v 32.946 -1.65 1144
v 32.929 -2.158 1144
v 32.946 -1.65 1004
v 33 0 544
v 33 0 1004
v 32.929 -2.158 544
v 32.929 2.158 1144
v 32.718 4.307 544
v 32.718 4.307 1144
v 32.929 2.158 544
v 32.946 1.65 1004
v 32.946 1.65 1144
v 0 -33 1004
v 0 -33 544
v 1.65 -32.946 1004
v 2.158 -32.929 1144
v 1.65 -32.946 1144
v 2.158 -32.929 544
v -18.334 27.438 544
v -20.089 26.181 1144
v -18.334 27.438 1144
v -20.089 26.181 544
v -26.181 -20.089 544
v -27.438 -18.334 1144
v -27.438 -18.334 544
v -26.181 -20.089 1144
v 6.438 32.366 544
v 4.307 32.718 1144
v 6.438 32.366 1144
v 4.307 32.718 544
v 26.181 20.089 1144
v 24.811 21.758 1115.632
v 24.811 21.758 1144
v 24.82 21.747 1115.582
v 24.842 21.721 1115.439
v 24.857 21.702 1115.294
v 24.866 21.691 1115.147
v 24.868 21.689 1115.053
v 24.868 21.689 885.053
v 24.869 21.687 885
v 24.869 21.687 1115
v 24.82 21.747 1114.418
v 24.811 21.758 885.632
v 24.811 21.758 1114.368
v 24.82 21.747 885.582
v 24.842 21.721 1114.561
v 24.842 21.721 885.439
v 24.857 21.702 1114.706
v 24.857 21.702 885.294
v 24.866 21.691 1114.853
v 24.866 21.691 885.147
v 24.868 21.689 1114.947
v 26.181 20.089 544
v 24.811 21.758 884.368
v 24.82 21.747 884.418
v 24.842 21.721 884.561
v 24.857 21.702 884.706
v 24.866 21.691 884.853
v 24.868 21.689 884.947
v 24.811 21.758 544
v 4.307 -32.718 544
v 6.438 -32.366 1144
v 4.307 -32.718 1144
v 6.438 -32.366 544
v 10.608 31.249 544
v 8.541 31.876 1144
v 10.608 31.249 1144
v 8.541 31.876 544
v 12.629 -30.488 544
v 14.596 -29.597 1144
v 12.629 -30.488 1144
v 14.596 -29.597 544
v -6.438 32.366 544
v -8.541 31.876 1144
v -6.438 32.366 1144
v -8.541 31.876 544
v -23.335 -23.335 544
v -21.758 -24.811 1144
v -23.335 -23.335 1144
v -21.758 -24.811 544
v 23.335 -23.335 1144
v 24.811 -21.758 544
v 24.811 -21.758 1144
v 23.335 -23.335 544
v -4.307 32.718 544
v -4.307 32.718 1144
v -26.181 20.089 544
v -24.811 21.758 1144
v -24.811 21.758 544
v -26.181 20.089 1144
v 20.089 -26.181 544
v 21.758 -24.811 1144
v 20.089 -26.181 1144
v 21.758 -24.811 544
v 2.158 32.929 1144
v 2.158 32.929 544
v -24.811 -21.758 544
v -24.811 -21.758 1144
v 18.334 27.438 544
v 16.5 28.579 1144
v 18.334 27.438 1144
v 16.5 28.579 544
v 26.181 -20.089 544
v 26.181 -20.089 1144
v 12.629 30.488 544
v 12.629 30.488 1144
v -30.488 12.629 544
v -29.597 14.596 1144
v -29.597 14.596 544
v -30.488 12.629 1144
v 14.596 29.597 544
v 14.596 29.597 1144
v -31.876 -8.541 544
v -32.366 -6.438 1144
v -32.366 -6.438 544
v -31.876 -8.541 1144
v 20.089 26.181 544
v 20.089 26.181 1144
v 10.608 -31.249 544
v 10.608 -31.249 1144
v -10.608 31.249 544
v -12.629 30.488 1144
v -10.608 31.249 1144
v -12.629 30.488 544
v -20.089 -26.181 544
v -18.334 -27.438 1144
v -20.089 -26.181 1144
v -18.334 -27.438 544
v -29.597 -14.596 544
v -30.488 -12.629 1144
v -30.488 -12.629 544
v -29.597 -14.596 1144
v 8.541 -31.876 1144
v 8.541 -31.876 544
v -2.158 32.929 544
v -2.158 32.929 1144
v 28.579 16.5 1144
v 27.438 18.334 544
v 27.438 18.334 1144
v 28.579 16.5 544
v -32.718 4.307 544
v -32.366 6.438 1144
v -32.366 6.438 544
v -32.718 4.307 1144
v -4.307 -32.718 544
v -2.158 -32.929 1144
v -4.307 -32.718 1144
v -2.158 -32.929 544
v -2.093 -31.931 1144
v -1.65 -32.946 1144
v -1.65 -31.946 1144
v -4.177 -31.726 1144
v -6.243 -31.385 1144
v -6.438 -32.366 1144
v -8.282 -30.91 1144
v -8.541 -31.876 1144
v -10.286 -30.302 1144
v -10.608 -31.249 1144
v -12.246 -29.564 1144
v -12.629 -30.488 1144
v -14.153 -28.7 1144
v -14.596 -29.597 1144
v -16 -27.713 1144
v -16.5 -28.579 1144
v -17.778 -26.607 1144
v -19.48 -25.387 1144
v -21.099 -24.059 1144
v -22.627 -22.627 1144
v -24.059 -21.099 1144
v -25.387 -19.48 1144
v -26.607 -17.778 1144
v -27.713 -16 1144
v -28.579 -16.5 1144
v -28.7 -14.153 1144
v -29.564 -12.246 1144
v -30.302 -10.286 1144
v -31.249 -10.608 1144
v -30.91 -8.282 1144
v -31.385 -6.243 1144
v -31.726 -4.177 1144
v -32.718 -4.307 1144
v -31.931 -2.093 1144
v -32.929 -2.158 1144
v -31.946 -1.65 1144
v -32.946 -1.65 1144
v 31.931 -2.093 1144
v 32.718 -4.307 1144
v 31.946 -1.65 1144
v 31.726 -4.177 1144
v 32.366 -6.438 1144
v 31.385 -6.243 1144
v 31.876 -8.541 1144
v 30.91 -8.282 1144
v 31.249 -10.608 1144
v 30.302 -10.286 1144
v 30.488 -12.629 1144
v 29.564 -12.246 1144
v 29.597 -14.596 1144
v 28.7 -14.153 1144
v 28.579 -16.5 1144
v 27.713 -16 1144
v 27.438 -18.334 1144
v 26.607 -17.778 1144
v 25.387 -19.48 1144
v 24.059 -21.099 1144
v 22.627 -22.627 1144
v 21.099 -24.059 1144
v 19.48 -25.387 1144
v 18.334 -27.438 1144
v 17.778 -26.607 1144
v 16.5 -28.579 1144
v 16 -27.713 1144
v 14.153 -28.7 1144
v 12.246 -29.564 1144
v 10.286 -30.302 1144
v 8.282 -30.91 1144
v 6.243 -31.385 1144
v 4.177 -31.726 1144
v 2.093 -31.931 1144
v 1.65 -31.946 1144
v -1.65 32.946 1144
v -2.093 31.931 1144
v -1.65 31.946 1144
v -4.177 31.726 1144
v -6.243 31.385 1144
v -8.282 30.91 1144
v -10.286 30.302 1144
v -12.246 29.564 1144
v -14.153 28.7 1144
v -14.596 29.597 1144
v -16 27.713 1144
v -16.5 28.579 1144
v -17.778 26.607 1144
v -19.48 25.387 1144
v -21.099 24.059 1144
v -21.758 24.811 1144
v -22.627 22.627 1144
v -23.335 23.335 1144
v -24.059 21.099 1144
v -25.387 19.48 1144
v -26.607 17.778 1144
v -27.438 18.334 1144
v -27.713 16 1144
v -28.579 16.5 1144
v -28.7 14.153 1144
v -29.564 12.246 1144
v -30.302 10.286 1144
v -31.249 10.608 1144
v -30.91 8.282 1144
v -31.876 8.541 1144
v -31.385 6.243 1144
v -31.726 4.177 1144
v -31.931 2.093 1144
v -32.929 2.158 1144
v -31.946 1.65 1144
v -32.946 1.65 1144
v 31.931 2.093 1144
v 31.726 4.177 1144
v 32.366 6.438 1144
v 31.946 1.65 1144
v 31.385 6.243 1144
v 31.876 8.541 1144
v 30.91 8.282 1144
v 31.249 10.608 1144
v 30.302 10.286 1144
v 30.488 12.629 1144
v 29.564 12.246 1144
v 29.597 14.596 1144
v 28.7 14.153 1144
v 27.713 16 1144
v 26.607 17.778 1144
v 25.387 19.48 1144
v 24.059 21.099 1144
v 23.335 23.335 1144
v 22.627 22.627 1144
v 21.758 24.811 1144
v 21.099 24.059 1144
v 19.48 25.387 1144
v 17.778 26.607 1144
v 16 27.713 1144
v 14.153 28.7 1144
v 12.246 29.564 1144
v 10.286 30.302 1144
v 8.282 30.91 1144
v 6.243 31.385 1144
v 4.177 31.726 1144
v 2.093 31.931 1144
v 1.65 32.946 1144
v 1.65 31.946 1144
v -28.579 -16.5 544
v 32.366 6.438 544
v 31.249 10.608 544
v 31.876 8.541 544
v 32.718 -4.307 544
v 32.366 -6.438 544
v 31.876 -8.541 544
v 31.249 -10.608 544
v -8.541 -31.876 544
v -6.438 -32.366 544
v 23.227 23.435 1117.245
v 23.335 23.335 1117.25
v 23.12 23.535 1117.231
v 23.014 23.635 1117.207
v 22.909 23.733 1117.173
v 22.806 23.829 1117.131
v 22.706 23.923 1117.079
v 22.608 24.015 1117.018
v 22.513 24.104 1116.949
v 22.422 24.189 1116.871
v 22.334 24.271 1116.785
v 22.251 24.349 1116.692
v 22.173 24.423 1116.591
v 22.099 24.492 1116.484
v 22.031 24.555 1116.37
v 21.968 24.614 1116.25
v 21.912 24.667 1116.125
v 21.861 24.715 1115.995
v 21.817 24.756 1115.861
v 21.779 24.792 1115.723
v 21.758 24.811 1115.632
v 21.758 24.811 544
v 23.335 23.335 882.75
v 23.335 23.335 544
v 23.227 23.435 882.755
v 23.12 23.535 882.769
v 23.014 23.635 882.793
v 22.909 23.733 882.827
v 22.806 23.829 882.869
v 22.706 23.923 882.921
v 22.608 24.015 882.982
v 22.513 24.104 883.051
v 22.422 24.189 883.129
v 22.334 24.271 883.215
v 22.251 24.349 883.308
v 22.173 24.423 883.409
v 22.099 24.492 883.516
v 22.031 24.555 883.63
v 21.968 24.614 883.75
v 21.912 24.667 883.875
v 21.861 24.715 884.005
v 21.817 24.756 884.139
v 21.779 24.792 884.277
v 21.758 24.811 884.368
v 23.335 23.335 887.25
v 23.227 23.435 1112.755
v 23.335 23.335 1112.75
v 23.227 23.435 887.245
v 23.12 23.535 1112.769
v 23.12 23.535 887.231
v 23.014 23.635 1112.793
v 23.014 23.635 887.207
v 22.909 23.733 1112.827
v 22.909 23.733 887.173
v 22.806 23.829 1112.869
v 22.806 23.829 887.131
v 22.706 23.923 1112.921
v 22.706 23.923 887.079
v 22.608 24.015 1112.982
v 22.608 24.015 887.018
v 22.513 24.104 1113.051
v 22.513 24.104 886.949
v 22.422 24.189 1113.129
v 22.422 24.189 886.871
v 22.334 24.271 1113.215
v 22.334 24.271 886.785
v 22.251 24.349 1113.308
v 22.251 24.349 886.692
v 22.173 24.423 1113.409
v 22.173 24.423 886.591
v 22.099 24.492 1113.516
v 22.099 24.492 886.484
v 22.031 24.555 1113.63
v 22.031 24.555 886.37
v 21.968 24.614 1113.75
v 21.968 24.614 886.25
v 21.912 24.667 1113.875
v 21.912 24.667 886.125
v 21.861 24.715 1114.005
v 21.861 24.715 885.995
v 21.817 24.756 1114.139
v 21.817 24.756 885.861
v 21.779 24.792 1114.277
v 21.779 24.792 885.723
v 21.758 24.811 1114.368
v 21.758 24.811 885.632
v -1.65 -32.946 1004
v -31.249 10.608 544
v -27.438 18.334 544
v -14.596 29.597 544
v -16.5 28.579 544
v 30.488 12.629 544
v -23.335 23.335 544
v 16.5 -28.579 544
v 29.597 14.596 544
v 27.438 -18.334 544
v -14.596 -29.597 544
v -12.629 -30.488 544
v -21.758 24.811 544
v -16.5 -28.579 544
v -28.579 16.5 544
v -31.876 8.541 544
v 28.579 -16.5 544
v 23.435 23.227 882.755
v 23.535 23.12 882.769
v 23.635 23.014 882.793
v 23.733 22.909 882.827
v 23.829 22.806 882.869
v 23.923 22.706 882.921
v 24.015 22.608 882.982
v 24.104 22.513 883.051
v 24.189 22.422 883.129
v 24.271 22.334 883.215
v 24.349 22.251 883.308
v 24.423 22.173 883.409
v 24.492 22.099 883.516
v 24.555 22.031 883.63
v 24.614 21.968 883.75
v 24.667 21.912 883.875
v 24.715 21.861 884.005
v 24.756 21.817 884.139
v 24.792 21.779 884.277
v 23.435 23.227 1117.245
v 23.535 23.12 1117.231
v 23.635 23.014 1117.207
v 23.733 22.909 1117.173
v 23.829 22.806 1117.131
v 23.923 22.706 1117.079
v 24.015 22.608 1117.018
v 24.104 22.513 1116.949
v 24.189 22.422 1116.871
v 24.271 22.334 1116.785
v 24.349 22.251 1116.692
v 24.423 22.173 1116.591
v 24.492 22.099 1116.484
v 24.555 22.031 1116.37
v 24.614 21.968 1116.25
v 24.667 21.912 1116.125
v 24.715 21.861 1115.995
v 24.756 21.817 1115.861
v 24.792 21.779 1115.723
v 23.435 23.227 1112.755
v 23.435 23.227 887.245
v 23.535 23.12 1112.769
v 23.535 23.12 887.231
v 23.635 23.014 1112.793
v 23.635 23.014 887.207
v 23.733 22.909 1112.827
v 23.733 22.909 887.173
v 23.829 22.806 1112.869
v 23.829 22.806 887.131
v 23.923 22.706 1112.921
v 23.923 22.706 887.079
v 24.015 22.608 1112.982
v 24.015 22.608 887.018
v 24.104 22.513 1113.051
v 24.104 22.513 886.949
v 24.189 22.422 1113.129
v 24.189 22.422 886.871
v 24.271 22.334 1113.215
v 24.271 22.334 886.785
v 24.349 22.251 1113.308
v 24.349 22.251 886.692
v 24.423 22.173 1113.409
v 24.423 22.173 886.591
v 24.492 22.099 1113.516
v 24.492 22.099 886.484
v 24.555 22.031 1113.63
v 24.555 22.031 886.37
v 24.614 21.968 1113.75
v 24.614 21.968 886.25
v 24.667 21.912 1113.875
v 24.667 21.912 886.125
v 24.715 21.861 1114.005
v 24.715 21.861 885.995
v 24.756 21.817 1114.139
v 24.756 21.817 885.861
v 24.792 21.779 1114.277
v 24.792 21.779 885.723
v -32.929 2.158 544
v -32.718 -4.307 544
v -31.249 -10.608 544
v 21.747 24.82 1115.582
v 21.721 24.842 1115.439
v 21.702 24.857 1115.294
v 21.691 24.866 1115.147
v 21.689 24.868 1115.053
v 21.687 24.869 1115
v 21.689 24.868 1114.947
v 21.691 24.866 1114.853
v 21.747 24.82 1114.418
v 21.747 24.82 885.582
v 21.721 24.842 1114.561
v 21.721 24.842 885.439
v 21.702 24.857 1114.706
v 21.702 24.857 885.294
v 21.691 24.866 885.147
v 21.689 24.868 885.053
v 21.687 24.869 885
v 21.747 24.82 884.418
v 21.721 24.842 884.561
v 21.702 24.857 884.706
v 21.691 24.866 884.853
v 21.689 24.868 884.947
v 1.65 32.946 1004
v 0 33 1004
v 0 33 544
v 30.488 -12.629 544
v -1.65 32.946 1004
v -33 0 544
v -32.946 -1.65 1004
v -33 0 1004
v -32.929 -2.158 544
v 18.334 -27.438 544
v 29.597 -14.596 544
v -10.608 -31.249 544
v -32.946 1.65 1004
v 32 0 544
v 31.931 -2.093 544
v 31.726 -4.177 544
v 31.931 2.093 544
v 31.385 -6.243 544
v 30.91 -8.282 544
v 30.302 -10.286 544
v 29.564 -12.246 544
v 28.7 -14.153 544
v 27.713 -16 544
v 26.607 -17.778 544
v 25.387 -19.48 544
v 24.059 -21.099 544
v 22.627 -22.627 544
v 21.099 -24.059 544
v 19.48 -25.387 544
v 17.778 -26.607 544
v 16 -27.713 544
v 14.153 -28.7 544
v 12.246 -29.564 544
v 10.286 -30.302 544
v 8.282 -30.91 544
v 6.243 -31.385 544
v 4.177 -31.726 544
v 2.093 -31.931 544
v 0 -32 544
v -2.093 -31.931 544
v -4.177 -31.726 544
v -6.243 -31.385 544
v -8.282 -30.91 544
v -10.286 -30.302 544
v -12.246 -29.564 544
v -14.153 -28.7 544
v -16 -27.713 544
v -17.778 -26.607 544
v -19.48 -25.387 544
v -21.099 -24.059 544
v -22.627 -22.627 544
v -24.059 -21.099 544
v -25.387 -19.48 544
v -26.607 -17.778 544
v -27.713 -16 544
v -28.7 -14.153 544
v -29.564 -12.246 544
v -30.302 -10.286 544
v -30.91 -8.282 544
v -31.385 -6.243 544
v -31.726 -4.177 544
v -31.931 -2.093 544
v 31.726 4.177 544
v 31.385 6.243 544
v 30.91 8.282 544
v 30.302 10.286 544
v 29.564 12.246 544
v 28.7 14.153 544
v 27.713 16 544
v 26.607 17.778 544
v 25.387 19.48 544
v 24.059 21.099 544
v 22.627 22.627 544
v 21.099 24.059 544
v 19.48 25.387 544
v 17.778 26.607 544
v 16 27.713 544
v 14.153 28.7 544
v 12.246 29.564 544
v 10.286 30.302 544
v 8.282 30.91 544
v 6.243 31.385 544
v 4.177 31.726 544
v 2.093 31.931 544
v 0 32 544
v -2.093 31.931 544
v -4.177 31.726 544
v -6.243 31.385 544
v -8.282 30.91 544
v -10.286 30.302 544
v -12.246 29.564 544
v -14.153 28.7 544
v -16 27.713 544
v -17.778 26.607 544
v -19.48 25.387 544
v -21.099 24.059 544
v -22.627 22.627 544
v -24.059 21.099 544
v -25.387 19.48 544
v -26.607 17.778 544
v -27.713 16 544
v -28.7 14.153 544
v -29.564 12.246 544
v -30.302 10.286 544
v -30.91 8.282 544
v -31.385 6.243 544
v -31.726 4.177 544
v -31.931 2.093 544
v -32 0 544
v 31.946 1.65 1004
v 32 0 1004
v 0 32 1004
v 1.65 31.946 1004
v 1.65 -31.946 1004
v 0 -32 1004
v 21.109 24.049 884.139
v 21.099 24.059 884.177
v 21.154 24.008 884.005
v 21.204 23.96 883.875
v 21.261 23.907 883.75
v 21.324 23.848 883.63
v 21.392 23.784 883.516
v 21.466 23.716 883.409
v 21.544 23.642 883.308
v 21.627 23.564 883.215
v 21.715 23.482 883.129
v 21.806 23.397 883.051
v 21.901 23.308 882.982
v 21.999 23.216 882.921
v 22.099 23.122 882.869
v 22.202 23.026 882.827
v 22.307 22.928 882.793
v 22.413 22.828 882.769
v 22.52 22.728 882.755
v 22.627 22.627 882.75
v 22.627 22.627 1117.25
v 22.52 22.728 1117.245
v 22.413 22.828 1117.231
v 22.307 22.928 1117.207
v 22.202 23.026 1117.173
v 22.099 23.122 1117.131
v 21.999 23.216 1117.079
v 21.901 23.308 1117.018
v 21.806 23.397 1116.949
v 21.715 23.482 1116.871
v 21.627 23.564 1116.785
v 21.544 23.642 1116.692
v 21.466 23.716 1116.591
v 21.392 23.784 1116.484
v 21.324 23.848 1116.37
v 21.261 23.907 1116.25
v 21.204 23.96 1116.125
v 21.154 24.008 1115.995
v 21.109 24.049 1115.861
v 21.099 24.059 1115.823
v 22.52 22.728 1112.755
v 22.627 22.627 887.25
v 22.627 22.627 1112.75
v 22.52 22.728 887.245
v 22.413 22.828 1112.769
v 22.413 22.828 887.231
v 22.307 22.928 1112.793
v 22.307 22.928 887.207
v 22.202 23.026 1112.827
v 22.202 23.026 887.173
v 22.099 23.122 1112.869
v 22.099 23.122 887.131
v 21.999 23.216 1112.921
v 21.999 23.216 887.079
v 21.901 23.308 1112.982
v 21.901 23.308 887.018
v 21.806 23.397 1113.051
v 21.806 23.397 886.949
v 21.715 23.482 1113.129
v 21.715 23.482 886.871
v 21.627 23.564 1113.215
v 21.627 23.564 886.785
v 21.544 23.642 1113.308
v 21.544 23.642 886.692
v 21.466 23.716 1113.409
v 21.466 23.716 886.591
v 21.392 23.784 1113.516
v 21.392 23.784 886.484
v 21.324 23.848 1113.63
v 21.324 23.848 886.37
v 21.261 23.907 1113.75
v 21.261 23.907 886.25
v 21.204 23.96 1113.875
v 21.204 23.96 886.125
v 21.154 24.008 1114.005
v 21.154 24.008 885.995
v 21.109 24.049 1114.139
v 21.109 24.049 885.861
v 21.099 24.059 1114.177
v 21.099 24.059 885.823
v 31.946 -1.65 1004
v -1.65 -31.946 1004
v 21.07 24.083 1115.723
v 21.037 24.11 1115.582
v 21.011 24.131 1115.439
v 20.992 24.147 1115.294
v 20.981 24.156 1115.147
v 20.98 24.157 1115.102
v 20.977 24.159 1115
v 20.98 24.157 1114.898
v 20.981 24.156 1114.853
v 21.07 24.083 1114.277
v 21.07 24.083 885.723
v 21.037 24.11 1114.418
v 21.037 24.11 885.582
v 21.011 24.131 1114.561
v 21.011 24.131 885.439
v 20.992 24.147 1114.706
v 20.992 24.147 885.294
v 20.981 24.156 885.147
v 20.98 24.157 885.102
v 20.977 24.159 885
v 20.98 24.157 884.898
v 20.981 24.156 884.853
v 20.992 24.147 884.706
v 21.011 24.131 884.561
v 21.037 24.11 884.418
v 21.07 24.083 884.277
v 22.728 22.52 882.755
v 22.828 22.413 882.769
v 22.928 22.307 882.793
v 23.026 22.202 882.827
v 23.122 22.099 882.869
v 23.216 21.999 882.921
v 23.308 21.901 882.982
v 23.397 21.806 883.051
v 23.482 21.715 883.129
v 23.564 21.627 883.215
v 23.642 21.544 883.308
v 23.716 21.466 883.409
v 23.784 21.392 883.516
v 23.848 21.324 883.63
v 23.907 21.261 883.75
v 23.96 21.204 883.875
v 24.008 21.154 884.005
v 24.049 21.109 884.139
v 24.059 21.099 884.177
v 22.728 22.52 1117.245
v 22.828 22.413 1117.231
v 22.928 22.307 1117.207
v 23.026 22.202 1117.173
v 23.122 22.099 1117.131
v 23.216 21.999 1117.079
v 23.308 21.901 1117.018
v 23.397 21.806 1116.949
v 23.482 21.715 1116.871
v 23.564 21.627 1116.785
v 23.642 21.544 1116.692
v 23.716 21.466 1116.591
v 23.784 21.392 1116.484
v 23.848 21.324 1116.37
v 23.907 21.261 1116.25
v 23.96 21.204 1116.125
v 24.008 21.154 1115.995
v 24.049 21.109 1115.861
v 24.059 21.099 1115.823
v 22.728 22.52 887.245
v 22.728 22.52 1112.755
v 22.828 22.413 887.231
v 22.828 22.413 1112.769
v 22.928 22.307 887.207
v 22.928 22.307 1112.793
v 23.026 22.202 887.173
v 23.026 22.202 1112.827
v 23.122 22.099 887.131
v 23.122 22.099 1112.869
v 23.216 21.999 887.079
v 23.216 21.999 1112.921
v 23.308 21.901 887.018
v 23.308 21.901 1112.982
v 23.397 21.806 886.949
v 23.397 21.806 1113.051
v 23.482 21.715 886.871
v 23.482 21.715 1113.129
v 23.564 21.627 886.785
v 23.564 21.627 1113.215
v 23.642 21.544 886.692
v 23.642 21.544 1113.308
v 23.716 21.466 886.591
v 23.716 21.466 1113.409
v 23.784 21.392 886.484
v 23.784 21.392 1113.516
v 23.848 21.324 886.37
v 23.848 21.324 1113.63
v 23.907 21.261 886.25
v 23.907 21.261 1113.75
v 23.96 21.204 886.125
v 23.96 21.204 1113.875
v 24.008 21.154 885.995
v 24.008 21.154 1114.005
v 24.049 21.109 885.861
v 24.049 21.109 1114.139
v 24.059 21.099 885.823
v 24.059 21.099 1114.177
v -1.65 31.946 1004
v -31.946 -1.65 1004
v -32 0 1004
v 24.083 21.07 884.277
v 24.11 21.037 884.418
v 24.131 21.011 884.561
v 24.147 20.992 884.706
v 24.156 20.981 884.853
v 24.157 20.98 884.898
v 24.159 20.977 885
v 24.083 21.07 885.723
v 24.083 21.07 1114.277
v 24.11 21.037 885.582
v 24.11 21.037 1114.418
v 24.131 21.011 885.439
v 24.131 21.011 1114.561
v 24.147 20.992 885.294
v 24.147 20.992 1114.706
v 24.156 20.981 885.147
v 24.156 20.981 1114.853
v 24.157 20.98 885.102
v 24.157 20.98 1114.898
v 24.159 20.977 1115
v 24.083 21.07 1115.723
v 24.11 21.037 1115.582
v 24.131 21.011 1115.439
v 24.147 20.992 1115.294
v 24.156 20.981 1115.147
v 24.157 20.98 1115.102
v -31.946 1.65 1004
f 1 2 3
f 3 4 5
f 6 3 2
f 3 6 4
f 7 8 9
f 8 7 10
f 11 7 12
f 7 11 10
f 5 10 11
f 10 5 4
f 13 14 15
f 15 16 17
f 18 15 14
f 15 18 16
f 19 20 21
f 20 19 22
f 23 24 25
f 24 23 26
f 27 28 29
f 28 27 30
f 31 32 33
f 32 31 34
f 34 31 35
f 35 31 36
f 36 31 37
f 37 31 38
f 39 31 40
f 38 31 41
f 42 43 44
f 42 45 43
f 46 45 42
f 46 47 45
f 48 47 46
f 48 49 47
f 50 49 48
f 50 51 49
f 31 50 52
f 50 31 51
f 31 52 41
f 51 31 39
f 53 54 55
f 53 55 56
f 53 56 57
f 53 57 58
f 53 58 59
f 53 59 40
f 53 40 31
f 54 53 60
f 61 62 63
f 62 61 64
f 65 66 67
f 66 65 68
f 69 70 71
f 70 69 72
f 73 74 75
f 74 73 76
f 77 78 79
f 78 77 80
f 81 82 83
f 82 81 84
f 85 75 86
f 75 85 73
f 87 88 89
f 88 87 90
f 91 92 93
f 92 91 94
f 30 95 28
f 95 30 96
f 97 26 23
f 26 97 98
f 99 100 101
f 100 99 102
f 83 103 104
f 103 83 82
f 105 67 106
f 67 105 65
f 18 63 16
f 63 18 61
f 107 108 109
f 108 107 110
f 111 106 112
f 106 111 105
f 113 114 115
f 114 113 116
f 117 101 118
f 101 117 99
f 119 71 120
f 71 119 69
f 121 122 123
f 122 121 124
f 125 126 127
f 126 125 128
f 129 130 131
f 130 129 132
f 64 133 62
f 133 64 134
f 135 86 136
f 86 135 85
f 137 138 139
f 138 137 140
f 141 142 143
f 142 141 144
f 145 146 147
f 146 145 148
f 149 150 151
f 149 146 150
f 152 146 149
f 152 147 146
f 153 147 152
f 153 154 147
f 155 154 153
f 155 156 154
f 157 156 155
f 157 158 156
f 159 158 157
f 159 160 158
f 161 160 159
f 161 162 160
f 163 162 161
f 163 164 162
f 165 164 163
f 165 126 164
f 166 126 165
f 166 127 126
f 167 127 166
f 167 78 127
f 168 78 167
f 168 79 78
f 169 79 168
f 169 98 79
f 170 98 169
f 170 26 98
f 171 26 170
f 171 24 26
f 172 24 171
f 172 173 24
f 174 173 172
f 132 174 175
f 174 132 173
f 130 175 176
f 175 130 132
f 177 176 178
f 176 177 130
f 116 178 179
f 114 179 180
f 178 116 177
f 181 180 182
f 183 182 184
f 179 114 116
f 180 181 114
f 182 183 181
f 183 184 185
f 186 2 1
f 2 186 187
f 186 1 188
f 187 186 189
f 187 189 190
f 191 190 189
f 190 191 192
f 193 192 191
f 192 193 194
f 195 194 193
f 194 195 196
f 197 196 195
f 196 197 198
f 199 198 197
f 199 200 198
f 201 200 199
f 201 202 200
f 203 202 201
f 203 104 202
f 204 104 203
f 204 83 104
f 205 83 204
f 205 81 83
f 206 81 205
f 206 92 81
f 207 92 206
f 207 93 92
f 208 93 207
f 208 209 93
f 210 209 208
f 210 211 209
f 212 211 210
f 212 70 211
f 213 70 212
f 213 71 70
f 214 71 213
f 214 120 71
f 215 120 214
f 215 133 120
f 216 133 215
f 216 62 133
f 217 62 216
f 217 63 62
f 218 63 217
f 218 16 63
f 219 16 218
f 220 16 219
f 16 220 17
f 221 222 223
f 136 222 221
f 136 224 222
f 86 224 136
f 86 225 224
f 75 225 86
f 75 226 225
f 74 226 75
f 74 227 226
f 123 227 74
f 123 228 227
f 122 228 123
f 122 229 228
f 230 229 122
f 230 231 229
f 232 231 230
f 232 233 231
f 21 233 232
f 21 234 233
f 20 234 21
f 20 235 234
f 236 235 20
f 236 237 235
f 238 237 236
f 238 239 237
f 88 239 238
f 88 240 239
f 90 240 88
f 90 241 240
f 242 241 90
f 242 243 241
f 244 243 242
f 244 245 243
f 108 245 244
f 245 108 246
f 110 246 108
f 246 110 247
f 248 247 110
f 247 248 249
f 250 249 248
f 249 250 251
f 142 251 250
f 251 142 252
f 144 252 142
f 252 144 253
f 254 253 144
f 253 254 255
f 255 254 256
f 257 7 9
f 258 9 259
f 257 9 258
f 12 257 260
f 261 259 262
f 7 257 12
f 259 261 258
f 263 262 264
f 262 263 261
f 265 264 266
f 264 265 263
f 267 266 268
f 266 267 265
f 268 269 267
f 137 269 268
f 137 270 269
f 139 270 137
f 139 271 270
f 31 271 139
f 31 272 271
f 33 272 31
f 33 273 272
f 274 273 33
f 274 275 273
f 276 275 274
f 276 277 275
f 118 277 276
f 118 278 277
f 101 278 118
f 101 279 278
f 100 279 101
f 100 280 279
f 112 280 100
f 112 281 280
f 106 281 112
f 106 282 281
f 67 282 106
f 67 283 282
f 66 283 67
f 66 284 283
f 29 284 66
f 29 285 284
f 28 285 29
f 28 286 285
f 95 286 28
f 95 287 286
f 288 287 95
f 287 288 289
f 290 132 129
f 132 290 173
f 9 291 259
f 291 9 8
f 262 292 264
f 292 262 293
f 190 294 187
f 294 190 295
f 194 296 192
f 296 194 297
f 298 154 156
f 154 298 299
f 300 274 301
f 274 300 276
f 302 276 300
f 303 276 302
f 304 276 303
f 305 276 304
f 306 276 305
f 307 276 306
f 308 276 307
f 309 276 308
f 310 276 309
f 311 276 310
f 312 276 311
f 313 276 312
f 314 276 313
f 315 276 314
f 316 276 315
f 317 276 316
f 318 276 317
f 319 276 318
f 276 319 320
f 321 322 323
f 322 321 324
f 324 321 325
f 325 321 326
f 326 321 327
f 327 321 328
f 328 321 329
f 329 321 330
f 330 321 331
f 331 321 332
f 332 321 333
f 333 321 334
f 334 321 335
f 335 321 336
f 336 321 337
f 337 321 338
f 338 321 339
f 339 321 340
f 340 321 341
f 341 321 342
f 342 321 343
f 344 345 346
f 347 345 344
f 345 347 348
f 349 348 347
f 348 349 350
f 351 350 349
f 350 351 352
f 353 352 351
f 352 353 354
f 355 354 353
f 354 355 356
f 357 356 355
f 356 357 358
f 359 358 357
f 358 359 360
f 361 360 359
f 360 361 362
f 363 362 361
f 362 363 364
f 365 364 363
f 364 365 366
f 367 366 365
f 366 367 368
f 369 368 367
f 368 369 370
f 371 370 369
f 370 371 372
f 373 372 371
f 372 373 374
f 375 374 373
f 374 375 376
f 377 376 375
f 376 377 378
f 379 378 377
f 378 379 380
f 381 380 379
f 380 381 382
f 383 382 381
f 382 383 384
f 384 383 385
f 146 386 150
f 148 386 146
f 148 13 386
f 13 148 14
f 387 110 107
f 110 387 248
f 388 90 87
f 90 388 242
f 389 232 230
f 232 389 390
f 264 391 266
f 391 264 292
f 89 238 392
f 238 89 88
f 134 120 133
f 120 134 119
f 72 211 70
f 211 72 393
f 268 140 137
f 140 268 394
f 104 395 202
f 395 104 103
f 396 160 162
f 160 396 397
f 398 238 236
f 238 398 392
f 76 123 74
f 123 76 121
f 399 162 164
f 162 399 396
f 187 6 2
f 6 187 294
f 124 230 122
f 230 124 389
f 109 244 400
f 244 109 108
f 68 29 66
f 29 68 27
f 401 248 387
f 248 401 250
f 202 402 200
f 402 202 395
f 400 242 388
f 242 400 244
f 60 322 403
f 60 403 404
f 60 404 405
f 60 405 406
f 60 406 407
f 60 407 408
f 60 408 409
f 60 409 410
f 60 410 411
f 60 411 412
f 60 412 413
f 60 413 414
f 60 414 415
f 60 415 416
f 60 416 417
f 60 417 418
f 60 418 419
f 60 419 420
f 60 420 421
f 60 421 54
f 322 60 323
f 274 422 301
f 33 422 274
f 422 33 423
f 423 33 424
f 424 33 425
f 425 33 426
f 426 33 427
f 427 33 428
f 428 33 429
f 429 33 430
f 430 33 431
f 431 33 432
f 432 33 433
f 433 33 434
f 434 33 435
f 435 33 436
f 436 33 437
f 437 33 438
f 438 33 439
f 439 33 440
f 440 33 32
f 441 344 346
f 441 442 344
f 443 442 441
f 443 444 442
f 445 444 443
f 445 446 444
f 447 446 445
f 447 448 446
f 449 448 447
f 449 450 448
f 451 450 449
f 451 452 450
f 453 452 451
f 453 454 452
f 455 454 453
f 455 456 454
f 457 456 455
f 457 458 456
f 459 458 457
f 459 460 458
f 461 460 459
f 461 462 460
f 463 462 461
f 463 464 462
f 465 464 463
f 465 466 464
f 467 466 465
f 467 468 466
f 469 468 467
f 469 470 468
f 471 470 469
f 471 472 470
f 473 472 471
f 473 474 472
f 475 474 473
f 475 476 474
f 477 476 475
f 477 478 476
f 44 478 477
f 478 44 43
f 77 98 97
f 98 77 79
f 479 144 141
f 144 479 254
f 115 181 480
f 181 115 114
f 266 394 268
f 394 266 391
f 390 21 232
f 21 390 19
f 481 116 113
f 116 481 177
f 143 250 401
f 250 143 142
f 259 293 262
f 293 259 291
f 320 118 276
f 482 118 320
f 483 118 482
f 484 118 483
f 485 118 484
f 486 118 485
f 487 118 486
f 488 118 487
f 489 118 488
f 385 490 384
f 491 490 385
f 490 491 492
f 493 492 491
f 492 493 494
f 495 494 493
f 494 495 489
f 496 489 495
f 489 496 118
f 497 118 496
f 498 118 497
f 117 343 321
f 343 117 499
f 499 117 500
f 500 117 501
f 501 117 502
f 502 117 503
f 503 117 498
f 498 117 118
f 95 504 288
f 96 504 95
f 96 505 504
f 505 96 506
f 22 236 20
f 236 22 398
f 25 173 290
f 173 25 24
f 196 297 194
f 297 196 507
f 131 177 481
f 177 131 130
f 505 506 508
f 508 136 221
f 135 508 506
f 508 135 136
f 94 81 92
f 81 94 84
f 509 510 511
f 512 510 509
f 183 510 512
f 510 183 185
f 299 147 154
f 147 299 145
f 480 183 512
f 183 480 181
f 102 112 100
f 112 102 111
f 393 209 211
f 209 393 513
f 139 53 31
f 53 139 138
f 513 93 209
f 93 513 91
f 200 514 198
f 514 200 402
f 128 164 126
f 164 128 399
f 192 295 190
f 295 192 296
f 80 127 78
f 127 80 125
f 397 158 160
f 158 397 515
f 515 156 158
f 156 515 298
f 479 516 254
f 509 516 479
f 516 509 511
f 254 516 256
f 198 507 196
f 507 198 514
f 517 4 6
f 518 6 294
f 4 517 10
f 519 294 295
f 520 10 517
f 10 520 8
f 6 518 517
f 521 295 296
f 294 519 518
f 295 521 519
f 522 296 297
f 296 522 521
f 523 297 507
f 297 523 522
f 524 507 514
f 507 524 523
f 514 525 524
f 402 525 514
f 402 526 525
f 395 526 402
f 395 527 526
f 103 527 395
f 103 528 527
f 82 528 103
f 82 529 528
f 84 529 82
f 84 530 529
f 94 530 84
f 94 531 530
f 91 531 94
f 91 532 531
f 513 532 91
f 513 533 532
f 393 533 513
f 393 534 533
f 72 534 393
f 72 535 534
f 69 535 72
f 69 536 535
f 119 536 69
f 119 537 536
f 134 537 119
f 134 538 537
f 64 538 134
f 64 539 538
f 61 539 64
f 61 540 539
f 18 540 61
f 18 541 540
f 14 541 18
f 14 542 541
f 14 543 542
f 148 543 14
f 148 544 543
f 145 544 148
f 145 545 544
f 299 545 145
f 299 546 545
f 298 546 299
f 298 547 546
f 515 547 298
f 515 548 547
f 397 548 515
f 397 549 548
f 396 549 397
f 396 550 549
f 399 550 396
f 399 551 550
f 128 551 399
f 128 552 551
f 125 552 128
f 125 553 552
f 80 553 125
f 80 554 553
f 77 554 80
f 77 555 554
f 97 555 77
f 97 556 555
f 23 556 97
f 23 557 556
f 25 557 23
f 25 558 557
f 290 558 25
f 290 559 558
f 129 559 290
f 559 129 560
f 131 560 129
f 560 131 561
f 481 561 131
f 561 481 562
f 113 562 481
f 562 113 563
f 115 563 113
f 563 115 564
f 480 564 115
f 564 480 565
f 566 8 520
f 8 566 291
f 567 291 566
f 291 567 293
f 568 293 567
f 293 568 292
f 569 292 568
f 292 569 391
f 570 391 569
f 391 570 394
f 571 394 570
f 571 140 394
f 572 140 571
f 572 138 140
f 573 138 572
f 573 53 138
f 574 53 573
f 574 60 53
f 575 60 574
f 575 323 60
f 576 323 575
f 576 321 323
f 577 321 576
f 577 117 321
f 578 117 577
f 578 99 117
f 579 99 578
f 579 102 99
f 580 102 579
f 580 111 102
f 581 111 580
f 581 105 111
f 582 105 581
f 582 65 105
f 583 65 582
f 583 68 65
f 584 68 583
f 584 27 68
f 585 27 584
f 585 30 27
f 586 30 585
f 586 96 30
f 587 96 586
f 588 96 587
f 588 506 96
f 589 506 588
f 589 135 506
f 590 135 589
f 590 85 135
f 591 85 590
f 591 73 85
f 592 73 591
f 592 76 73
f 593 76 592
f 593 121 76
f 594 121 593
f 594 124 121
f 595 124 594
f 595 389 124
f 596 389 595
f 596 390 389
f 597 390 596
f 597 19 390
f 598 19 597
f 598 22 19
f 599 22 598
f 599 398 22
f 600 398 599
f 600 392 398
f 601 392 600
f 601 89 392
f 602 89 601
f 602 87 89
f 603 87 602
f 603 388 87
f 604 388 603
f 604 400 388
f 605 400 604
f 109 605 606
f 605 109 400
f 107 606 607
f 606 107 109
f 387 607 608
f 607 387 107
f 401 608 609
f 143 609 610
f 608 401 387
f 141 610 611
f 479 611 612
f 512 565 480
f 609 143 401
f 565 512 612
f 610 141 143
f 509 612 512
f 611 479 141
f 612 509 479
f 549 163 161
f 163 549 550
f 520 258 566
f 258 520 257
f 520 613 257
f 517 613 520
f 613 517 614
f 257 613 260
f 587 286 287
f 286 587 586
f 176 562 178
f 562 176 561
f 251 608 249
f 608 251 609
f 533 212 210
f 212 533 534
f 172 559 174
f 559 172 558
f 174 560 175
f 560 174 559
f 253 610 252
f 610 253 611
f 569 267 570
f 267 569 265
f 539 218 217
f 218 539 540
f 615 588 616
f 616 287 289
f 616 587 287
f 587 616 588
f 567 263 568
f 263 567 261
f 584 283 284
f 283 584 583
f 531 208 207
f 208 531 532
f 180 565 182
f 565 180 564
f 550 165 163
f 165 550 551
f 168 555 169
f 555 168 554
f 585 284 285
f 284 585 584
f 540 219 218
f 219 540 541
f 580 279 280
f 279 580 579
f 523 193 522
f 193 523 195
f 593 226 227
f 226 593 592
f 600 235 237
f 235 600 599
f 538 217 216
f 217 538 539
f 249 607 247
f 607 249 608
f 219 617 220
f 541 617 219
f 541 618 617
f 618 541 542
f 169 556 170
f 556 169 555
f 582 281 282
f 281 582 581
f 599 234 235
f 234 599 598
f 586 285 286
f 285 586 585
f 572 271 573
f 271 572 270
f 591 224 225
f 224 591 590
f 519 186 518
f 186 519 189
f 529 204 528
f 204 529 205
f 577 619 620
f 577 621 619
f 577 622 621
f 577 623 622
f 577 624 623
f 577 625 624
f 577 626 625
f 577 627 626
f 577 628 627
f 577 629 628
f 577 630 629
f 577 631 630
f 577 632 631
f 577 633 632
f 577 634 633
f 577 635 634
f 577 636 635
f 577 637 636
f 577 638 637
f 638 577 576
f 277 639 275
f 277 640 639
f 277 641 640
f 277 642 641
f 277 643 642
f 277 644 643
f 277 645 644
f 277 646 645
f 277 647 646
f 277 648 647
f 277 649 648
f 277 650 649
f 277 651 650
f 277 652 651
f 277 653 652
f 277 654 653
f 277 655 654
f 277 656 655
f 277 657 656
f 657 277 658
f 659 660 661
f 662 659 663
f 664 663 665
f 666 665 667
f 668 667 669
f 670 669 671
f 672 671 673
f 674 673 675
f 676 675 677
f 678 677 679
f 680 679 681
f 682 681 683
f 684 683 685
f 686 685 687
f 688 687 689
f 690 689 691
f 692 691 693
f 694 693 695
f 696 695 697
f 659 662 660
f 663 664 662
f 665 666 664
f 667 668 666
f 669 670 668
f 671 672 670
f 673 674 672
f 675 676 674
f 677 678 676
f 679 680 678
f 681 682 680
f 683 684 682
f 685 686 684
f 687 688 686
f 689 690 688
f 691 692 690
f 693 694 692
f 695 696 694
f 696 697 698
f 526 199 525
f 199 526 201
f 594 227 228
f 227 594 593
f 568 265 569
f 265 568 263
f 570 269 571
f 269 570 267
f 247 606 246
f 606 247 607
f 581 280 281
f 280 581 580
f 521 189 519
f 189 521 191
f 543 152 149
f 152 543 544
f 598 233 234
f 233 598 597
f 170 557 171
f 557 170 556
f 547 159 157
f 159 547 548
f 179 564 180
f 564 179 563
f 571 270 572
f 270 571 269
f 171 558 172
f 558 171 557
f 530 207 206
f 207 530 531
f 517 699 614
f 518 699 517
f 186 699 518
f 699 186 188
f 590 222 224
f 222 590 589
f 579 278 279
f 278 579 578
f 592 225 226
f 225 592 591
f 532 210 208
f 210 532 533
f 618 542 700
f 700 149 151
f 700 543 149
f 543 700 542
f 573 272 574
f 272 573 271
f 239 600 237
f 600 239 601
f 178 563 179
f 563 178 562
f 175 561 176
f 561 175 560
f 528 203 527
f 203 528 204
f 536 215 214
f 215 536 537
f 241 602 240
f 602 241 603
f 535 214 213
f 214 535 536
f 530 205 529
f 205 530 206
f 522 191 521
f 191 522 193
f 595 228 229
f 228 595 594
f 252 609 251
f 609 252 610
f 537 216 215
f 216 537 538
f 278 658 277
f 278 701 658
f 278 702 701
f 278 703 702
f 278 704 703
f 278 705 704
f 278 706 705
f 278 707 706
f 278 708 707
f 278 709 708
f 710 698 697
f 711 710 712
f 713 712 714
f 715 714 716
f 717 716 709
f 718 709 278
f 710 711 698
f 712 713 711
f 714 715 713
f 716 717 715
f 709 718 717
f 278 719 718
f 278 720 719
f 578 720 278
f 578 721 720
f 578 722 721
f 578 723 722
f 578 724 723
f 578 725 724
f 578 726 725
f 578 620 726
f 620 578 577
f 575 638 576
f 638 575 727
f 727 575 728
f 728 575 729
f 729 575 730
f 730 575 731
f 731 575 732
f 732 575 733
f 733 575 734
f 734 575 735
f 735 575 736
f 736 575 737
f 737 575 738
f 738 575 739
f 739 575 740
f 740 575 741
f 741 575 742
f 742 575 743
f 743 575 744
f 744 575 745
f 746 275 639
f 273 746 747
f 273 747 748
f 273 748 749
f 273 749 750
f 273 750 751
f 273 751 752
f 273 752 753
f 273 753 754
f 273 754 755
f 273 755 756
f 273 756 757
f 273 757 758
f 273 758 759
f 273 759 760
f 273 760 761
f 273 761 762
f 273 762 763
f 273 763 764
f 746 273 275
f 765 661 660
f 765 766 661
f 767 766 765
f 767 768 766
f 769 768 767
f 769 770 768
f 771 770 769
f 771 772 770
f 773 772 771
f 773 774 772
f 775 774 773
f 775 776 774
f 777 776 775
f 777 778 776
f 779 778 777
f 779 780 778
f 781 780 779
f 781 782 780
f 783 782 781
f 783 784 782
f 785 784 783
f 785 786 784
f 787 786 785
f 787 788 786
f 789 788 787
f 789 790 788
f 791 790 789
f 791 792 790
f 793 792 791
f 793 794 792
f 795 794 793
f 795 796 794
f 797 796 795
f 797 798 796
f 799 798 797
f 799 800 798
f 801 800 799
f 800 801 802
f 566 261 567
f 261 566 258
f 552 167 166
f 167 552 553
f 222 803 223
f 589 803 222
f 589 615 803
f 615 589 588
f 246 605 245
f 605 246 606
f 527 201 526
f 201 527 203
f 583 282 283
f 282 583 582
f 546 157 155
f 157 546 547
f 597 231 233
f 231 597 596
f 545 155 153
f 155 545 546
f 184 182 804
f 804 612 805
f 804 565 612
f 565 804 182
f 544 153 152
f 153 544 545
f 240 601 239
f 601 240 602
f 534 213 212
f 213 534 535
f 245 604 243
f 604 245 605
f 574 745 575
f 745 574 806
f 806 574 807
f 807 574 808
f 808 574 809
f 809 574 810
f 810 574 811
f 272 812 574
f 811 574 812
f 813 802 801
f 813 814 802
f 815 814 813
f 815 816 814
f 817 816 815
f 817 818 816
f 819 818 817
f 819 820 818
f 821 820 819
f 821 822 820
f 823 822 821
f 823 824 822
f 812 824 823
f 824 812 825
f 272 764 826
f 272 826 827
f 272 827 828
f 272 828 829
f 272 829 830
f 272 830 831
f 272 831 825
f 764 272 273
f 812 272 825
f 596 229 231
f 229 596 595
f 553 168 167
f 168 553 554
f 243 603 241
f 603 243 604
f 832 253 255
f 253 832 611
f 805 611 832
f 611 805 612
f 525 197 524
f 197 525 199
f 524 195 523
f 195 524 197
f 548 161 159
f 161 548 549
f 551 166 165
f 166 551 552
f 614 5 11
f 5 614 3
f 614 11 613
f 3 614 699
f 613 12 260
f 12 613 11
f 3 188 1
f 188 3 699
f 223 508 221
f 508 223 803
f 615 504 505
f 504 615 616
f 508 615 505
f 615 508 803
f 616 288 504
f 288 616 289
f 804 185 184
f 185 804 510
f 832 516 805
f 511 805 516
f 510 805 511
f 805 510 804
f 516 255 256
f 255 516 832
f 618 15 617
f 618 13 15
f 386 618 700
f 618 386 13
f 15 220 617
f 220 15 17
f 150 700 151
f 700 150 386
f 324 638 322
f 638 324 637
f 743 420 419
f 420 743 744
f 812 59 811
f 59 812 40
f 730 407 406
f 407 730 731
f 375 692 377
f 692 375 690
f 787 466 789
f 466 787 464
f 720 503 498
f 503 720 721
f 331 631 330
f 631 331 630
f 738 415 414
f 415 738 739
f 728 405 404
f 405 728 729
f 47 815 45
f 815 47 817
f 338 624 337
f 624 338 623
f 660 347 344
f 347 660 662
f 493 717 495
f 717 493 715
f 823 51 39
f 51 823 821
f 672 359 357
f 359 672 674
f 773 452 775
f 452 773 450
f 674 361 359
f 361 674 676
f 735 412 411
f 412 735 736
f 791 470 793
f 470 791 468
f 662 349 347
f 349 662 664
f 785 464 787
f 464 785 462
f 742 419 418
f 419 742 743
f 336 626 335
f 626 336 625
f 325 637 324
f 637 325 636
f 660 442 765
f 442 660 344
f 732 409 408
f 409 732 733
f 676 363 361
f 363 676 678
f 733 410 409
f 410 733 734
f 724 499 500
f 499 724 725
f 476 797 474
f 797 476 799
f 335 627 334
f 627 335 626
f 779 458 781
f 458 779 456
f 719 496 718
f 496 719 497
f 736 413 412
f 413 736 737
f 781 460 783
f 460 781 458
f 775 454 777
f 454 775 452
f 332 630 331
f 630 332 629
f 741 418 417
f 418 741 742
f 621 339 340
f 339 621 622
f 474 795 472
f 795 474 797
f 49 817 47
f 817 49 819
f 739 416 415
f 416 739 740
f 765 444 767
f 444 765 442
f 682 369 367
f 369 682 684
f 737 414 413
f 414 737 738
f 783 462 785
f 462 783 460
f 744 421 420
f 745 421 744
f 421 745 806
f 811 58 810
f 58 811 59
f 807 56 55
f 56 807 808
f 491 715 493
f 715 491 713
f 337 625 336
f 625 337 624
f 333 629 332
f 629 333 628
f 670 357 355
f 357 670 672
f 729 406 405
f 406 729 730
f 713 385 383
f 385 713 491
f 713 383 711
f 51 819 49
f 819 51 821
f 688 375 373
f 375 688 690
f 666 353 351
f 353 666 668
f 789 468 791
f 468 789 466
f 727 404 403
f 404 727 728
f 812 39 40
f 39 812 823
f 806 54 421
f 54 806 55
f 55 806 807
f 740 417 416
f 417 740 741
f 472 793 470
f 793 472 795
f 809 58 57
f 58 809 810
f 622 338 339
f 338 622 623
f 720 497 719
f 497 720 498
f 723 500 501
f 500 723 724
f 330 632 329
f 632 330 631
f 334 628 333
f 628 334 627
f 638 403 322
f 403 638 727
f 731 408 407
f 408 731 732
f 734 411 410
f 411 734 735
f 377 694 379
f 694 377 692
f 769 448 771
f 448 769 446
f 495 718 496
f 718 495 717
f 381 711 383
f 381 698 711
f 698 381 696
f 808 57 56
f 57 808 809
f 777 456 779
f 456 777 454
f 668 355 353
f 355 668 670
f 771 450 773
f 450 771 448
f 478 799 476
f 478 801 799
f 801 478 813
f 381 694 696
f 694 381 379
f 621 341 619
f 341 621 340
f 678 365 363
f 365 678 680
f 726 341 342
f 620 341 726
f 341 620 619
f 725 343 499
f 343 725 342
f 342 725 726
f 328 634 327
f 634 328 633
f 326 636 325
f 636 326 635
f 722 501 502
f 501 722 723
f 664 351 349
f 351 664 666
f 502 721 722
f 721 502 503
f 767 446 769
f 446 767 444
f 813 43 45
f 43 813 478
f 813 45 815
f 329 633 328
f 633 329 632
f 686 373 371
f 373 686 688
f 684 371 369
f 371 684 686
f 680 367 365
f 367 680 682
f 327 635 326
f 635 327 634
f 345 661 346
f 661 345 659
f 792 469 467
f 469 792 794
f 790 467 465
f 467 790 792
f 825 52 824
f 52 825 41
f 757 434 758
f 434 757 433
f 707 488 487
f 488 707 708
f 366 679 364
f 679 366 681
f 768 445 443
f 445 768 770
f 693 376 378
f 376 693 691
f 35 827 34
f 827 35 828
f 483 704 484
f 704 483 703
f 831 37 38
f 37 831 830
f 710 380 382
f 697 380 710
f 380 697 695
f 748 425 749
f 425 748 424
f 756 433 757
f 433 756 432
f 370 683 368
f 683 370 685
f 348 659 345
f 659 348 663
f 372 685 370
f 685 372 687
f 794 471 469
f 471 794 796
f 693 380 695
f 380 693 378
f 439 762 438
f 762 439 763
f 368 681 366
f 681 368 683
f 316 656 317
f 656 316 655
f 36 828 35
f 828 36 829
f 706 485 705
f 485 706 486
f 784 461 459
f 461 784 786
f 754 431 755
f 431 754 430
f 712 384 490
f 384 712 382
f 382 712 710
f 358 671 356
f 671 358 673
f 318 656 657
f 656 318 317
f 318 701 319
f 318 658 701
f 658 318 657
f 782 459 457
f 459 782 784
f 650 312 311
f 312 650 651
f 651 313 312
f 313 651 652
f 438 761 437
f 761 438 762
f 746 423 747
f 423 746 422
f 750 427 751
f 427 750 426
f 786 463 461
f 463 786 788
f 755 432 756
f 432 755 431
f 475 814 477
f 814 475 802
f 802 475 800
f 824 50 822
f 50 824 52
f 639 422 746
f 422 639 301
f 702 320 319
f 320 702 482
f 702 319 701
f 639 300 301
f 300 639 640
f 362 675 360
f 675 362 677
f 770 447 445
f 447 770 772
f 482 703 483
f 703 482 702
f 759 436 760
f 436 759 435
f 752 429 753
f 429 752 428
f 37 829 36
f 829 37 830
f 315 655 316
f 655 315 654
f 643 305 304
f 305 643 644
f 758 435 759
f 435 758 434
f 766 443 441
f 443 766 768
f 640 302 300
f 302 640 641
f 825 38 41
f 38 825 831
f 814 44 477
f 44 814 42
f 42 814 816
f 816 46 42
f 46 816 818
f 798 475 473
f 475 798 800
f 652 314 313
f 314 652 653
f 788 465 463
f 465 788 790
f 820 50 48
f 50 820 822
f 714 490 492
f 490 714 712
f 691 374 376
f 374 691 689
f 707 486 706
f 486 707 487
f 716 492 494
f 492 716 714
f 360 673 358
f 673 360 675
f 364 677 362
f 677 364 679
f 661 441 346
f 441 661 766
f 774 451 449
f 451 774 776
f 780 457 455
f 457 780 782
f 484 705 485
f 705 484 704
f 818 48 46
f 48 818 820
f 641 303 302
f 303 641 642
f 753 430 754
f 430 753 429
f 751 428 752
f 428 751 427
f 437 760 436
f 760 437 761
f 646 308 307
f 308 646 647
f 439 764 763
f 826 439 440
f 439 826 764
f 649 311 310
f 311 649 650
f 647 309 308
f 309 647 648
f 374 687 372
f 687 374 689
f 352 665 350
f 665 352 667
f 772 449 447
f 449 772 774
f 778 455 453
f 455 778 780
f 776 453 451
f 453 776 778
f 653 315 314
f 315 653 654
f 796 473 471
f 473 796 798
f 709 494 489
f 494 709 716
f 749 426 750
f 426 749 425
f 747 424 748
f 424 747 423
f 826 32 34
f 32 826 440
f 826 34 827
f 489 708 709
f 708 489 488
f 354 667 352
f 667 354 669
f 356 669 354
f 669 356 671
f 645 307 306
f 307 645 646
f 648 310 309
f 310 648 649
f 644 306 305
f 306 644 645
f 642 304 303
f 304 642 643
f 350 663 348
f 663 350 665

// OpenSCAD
// file: ../lib/astra66_core.scad
// =============================================================================
// ASTRA-66 CAD rev B -- core library
// Parameters (generated from analysis.py by build.py), derived stations and helpers.
// Every part file includes this; stations mirror analysis.py X[] exactly.
//
// Frame: rocket axis = +Z, STA 0 = nose tip, stations increase aft.
// Angles: measured about +Z from +X toward +Y.  90 deg = switch / hatch side,
// 270 deg = camera side, 45 deg = rail-button line, fins at 0/90/180/270 deg.
// =============================================================================
include <../astra66_params.scad>

$fn = FN;
EPS = 0.01;
CAD_REV = "B";

// ----------------------------------------------------------------- radii
R_OD    = BODY_OD / 2;                 // body tube outer
R_ID    = BODY_ID / 2;                 // body tube inner
R_SH    = (BODY_ID - FIT_SH) / 2;      // printed shoulder / ring OD radius
R_SI    = R_SH - NC_SH_WALL;           // nose shoulder inner radius
R_CO    = CPL_OD / 2;                  // coupler outer
R_CI    = CPL_ID / 2;                  // coupler inner
R_BH_IN = (CPL_ID - 0.2) / 2;          // inner bulkhead disc (fits in coupler)
R_MO    = MMT_OD / 2;
R_MI    = MMT_ID / 2;
R_RING_BORE = (MMT_OD + FIT_SH) / 2;   // centering-ring / core bore
R_TAB_FLOOR = max(R_MO, RET_CLEAR_D / 2);          // rev B: tab clears the COTS retainer
FIN_TAB_H   = R_OD - R_TAB_FLOOR - FIN_TAB_CLR;

// ----------------------------------------------------------------- stations
X_NC_BASE     = NC_L;
X_SH_END      = NC_L + NC_SH_L;
X_PL_END      = NC_L + PL_L;
X_BAND_END    = X_PL_END + AV_BAND_L;
X_END         = X_BAND_END + BO_L;
L_OVERALL     = X_END;                              // airframe length (excl. COTS retainer)
X_CPL_FWD     = X_PL_END - AV_INS;
X_CPL_AFT     = X_BAND_END + AV_INS;
X_AVB_FWD_OUT = X_CPL_FWD - AV_BH_T;                // AV-303 forward face
X_AVB_AFT_OUT = X_CPL_AFT + GASKET_T;               // AV-304 outer-disc forward face
X_AVB_AFT_END = X_AVB_AFT_OUT + AV_BH_T;            // AV-304 aft face (recovery bay starts)
X_SLED_FWD    = X_CPL_FWD + AV_BH_T + SLED_FWD_GAP;
X_SLED_AFT    = X_SLED_FWD + SLED_L;
X_MMT_AFT     = X_END + MMT_AFT_EXT;
X_MMT_FWD     = X_MMT_AFT - MMT_L;
X_FIN_LE      = X_END - FIN_CR;
X_TAB_FWD     = X_FIN_LE + FIN_TAB_FWD;
X_TAB_AFT     = X_END - LOCK_T;
X_CORE_FWD    = X_TAB_FWD - CORE_RING_T;
X_CORE_AFT    = X_END - LOCK_T;
X_NC_SCREW    = NC_L + NC_SH_L / 2;
X_CAM         = X_SH_END + CAM_OFF;
X_HATCH       = X_SH_END + HATCH_OFF;
X_RB_FWD      = X_MMT_FWD - RB_FWD_OFF;
X_RB_AFT      = X_END - RB_AFT_OFF;
X_TRAY_FWD    = X_AVB_FWD_OUT - TRAY_L;
X_SW          = X_PL_END + AV_BAND_L / 2;
X_MOTOR_FWD   = X_MMT_AFT - MOTOR_L;
X_BAT0        = X_SLED_FWD + 2;
BAT_CAGE_L    = 12 + BAT_L + 0.6;
PAYLOAD_BAY_L  = X_AVB_FWD_OUT - X_SH_END;
RECOVERY_BAY_L = X_MMT_FWD - X_AVB_AFT_END;

FIN_ANGLES      = [for (i = [0 : FIN_N - 1]) i * 360 / FIN_N];
LOCK_SCREW_ANG  = [45, 135, 225, 315];
STATIC_PORT_ANG = [45, 135, 225, 315];

// ----------------------------------------------------------------- geometry helpers
function ogive_rho()  = (R_OD * R_OD + NC_L * NC_L) / (2 * R_OD);
function ogive_r(x)   = sqrt(max(pow(ogive_rho(), 2) - pow(NC_L - x, 2), 0)) + R_OD - ogive_rho();

// Solid of revolution of the tangent ogive between stations x0..x1, radially offset inward by off.
module ogive_solid(x0, x1, off = 0, n = 72) {
    s = (x0 == 0) ? 1 : 0;
    rotate_extrude()
        polygon(concat([[0, x0]],
                       [for (i = [s : n]) let(x = x0 + (x1 - x0) * i / n) [max(ogive_r(x) - off, 0.01), x]],
                       [[0, x1]]));
}

module tube_r(ro, ri, z0, z1) {
    translate([0, 0, z0]) difference() {
        cylinder(r = ro, h = z1 - z0);
        translate([0, 0, -1]) cylinder(r = ri, h = z1 - z0 + 2);
    }
}

module at_angle(a) { rotate([0, 0, a]) children(); }

// Cylinder of diameter d along the radial direction at angle a, from radius r0 to r1, at station z.
module radial_cyl(d, z, a, r0, r1) {
    at_angle(a) translate([r0, 0, z]) rotate([0, 90, 0]) cylinder(d = d, h = r1 - r0);
}

module rounded_rect(l, w, r) { offset(r = r) square([l - 2 * r, w - 2 * r], center = true); }

// Radial prism with a rounded-rectangle footprint (l axial x w tangential) centred at station z.
module radial_prism(a, z, l, w, rr, r0, r1) {
    at_angle(a) translate([r0, 0, z]) rotate([0, 90, 0]) linear_extrude(r1 - r0) rounded_rect(l, w, rr);
}

// Block in the radial frame at angle a: radial r0..r1, tangential +/-hw, stations z0..z1, clipped to radius rc.
module radial_block(a, r0, r1, hw, z0, z1, rc) {
    intersection() {
        at_angle(a) translate([r0, -hw, z0]) cube([r1 - r0, 2 * hw, z1 - z0]);
        translate([0, 0, z0 - 1]) cylinder(r = rc, h = z1 - z0 + 2);
    }
}

// Camera frame: child +Z = lens axis (outward, tilted CAM_TILT aft), origin at the lens face centre.
// Lens-face radius CAM_R0 is the smaller of (a) the tilted barrel rim 0.5 mm inside the bore and
// (b) the tilted camera-body corners 0.5 mm inside the bore -- so any CAM_W/CAM_LEN entered fits.
CAM_SETBACK = CAM_LENS_L * cos(CAM_TILT) + (CAM_LENS_HOLE - 1) / 2 * sin(CAM_TILT) + 0.5;
CAM_R0 = min(R_ID - CAM_SETBACK, sqrt(pow(R_ID - 0.5, 2) - pow(CAM_W / 2, 2)) - CAM_LEN / 2 * sin(CAM_TILT));
module cam_frame() {
    at_angle(CAM_ANG) translate([CAM_R0, 0, X_CAM]) rotate([0, 90 - CAM_TILT, 0]) children();
}

echo(str("ASTRA-66 CAD rev ", CAD_REV, ": L_OVERALL=", L_OVERALL, " payload bay=", PAYLOAD_BAY_L,
         " recovery bay=", RECOVERY_BAY_L, " fin tab depth=", FIN_TAB_H));
// main file
// ASTRA-66 CAD rev B -- BO-401 Booster tube (recovery bay + fin can shell)
// 4 fin slots (FIN_T + FIN_SLOT_CLR) from the tab front to the tail, open aft (rev B: slot starts at
// X_TAB_FWD, so the fin root ahead of the tab sits on the tube surface). 2 rail-button holes on the RB_ANG line.
include <../lib/astra66_core.scad>

module BO_401_booster_tube() {
    difference() {
        tube_r(R_OD, R_ID, X_BAND_END, X_END);
        for (a = FIN_ANGLES) at_angle(a) translate([R_ID - 1, -(FIN_T + FIN_SLOT_CLR) / 2, X_TAB_FWD]) cube([R_OD - R_ID + 2, FIN_T + FIN_SLOT_CLR, X_END - X_TAB_FWD + 1]);
        for (z = [X_RB_FWD, X_RB_AFT]) radial_cyl(CLR_M4, z, RB_ANG, R_ID - 1, R_OD + 1);
    }
}

BO_401_booster_tube();
